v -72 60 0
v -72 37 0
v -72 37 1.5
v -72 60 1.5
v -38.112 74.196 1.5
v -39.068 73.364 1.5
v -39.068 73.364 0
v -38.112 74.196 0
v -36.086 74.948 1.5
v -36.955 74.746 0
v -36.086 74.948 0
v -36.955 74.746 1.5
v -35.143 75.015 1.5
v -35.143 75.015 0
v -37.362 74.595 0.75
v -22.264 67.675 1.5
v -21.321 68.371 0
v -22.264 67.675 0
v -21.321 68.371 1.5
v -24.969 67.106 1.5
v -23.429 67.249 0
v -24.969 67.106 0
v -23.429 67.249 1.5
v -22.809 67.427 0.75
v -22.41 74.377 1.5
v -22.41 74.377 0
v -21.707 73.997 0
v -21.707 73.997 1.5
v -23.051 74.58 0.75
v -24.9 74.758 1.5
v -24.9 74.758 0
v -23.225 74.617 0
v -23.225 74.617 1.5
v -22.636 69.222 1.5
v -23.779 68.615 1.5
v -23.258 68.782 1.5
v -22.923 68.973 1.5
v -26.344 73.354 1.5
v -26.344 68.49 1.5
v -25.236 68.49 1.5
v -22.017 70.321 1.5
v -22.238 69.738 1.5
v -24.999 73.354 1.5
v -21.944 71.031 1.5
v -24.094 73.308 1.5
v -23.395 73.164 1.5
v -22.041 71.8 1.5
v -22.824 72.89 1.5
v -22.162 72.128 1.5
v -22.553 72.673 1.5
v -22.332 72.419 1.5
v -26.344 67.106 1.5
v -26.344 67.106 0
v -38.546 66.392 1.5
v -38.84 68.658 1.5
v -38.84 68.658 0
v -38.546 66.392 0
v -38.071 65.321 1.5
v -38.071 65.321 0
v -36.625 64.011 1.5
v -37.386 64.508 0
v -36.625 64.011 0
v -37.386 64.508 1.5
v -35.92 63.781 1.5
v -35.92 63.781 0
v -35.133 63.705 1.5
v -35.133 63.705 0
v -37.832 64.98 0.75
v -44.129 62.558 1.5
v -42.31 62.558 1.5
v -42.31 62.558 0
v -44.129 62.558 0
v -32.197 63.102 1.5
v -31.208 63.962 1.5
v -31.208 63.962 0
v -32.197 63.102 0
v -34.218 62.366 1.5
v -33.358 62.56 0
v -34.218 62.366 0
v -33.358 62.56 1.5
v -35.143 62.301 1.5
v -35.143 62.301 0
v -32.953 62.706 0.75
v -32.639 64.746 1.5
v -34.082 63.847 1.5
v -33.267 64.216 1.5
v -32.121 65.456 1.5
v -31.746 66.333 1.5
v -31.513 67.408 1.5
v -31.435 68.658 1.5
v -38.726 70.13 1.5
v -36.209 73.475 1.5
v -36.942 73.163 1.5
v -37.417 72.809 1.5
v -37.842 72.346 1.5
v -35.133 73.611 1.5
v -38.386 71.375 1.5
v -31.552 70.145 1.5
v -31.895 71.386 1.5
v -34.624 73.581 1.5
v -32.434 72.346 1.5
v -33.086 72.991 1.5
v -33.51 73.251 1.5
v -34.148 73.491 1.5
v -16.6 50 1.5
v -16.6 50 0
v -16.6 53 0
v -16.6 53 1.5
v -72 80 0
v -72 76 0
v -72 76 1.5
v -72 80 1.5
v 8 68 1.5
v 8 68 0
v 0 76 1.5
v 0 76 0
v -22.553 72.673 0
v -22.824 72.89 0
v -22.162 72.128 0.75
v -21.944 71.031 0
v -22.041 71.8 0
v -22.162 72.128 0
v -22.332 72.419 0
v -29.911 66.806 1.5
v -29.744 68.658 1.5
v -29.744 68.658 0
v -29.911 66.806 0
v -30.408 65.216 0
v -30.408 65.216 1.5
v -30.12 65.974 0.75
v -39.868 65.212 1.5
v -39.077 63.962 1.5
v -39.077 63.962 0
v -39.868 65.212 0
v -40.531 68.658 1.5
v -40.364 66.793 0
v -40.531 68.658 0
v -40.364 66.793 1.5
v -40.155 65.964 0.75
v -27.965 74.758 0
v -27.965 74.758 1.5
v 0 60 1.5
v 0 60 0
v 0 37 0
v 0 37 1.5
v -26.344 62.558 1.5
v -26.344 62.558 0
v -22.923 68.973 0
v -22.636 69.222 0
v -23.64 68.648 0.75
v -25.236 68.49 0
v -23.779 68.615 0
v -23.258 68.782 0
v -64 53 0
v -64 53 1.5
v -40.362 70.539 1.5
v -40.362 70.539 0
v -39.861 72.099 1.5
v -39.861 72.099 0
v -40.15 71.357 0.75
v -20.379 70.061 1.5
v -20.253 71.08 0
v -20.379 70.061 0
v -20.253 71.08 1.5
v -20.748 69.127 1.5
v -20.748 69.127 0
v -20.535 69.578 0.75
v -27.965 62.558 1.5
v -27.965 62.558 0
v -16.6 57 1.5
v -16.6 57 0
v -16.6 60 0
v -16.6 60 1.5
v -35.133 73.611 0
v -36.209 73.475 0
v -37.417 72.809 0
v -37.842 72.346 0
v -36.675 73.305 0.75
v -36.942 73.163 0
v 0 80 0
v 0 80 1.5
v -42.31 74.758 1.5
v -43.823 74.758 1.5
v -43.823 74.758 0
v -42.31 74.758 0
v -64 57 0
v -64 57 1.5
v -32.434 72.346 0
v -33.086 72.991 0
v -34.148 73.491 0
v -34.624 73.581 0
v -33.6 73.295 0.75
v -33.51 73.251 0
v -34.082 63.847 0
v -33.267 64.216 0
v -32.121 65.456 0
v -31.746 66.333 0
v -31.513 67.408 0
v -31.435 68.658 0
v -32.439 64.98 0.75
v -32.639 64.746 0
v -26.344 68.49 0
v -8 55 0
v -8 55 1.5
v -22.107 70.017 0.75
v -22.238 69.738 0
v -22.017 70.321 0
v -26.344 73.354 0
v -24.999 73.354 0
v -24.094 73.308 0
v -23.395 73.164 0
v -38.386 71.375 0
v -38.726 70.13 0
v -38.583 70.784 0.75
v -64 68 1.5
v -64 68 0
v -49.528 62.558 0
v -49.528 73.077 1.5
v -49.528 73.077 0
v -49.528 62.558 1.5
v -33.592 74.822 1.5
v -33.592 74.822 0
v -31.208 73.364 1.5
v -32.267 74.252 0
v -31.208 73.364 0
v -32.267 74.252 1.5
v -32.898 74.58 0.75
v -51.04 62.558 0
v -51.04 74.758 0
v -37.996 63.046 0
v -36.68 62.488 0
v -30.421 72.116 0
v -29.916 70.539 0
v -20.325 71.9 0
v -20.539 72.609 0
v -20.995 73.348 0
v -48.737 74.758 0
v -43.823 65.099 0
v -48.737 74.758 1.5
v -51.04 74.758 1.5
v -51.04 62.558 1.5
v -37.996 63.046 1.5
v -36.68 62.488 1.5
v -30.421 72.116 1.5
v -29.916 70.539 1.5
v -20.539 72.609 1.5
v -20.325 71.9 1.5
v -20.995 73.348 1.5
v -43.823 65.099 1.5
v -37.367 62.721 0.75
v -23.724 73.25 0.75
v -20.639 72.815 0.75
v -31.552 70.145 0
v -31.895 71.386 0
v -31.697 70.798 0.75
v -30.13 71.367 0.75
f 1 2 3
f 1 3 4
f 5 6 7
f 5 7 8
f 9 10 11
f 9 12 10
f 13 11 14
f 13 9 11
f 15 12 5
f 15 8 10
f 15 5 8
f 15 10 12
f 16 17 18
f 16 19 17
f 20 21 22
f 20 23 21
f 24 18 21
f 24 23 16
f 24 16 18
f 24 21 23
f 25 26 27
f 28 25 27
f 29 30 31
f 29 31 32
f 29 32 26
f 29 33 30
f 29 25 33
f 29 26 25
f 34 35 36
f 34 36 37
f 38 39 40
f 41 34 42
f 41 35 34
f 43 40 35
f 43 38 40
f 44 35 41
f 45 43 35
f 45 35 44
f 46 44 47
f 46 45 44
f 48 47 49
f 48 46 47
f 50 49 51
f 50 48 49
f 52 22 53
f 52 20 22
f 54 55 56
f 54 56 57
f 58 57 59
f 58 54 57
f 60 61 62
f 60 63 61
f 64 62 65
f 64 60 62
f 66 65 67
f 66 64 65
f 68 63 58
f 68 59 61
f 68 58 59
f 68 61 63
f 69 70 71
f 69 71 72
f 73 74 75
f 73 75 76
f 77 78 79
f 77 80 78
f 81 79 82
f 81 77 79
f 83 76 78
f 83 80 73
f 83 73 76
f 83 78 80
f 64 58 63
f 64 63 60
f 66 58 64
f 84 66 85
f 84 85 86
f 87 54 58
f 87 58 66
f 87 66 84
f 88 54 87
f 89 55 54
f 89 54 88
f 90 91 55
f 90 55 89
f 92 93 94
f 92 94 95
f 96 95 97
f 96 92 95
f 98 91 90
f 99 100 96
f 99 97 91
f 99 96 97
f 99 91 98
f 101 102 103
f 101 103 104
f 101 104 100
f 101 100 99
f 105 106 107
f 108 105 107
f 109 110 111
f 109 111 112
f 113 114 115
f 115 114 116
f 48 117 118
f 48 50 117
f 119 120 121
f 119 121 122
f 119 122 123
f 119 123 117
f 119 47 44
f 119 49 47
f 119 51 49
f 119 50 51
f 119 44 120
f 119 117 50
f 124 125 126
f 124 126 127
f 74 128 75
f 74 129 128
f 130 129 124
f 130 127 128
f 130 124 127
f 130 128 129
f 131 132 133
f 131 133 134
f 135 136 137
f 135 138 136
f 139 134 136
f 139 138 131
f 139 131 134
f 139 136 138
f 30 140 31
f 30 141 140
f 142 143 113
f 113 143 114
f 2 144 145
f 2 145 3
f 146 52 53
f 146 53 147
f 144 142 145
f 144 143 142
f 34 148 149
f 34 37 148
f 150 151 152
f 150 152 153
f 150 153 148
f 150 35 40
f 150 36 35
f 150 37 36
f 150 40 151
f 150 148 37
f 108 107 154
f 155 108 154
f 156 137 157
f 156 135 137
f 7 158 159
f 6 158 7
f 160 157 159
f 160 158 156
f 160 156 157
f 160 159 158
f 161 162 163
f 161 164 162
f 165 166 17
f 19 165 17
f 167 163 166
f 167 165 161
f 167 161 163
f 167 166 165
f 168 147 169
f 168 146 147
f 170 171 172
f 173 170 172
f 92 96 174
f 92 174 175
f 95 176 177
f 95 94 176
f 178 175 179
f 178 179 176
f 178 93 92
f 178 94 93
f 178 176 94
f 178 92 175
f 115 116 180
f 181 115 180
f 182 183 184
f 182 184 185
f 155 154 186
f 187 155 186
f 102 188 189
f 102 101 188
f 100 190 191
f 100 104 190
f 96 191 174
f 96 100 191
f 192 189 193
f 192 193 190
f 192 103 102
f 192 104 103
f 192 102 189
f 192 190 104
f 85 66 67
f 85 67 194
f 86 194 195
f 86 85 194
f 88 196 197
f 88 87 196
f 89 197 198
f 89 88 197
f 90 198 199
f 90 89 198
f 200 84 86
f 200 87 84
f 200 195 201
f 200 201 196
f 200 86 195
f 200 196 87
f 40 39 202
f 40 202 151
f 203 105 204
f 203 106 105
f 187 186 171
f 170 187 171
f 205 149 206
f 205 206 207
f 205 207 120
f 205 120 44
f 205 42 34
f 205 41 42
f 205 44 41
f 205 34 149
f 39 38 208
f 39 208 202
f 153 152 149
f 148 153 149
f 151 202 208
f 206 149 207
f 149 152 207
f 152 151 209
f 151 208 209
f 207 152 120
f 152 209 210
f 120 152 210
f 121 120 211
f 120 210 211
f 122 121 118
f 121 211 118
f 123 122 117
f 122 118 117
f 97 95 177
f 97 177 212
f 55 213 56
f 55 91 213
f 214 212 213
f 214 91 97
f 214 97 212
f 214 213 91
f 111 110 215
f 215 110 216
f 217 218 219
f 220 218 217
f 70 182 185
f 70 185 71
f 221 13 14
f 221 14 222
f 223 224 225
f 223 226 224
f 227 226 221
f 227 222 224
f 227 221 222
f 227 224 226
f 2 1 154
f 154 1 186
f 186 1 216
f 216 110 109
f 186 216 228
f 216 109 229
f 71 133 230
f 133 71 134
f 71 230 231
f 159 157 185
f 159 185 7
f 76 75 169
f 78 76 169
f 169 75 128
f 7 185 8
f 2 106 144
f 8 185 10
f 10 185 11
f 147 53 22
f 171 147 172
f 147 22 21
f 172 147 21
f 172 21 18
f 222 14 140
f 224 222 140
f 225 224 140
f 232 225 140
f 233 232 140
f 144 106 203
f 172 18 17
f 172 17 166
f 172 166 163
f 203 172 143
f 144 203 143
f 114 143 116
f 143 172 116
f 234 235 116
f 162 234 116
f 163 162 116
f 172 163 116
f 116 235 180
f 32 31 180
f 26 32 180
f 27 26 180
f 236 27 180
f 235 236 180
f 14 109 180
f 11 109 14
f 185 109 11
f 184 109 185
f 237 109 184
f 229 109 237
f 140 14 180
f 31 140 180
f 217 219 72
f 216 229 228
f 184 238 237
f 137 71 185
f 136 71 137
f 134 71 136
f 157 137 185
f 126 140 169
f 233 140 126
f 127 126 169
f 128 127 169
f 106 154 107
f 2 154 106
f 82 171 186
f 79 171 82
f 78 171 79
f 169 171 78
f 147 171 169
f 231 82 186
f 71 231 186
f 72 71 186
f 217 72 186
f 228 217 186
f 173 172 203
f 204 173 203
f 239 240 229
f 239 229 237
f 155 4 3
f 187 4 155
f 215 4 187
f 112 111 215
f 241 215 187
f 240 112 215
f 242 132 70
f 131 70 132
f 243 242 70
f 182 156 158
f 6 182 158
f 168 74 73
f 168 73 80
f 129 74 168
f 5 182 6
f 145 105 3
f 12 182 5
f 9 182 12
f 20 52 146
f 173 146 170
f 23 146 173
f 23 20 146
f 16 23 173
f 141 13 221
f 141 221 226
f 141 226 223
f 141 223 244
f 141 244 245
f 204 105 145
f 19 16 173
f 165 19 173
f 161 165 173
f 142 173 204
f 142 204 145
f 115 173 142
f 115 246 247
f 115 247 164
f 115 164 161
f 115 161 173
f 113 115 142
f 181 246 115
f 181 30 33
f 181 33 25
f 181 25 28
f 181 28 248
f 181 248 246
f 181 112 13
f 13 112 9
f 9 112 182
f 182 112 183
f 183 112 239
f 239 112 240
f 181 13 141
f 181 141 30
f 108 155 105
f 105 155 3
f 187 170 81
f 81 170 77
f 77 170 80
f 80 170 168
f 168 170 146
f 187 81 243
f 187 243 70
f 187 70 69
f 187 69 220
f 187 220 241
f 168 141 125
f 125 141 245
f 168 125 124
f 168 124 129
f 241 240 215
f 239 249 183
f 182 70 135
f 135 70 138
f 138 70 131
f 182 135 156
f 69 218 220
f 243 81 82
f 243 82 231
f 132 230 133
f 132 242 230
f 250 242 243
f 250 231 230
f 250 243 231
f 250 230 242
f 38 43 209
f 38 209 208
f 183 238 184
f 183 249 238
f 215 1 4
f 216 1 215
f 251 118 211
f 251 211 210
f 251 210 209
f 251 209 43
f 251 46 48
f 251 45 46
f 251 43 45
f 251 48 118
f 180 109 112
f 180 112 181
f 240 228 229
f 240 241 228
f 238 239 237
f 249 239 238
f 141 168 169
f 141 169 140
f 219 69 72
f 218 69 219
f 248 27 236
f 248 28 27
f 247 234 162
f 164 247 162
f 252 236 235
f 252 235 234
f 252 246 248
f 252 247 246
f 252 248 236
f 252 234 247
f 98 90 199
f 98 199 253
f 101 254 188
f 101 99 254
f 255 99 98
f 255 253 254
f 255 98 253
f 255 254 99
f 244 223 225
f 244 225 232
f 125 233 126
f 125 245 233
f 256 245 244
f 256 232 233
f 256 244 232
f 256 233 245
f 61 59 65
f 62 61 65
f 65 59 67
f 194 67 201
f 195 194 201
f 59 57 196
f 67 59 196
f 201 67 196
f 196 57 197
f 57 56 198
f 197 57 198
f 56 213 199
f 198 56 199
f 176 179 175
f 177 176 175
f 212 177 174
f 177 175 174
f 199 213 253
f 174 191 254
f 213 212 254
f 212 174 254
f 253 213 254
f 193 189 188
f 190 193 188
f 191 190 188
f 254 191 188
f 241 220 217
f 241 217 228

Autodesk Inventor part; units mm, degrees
ref_plane "YZ Plane" through (0, 0, 0) normal (1, 0, 0) x (0, 1, 0)
ref_plane "XZ Plane" through (0, 0, 0) normal (0, 1, 0) x (-1, 0, 0)
ref_plane "XY Plane" through (0, 0, 0) normal (0, 0, 1) x (1, 0, 0)
sketch "Sketch1" plane through (0, 0, 0) normal (0, 0, 1) x (1, 0, 0)
  circle A0 centre (-72, 68) radius 8 construction
  line L0 (-72, 60) -> (0, 60) construction
  line L1 (-72, 76) -> (-64, 68)
  line L2 (-72, 60) -> (-64, 68)
  line L3 (-72, 76) -> (-72, 80)
  line L4 (0, 76) -> (0, 80)
  line L5 (-72, 80) -> (0, 80)
  line L6 (-72, 76) -> (11.4847, 76) construction
  line L7 (-64, 68) -> (11.3495, 68) construction
  line L8 (-72, 60) -> (23.0654, 60) construction
  circle A1 centre (0, 68) radius 8 construction
  line L9 (0, 60) -> (8, 68)
  line L10 (8, 68) -> (0, 76)
  line L11 (-34, 51.1) -> (-34, 39.9508) construction
  line L12 (-36, 51.1) -> (-36, 38.5) construction
  line L13 (0, 37) -> (-91.064, 37) construction
  line L14 (0, 37) -> (-72, 37)
  line L15 (-64, 68) -> (-64, -7.5721) construction
  line L16 (31.0795, 0) -> (31.0795, 55) construction
  line L17 (31.0795, 55) -> (-111.8136, 55) construction
  line L18 (-8, 68) -> (-8, -20.4909) construction
  line L19 (-8, 55) -> (-16.6, 55) construction
  line L20 (-16.6, 55) -> (-16.6, 50) construction
  line L21 (-16.6, 50) -> (-8, 55)
  line L22 (-16.6, 60) -> (-8, 55)
  line L23 (-16.6, 50) -> (-16.6, 53)
  line L24 (-16.6, 53) -> (-64, 53)
  line L25 (-64, 53) -> (-64, 57)
  line L26 (-64, 57) -> (-16.6, 57)
  line L27 (-16.6, 57) -> (-16.6, 60)
  line L28 (-72, 37) -> (-72, 60)
  line L29 (-72, 35.1512) -> (-72, 37)
  line L30 (0, 60) -> (0, 37)
  point P0 (0, 78)
  point P1 (-72, 78)
  point P2 (-137.4598, 47.0487)
  dimension "d5" = 72
  dimension "d50" = 55
  dimension "d51" = 8.6
  dimension "d52" = 5
  dimension "d54" = 4
  dimension "d55" = 1.5
extrude "Extrusion7" add sketch "Sketch1" along normal blind 1.5
sketch "Sketch10" plane through (0, 0, 1.5) normal (0, 0, 1) x (1, 0, 0)
  line L0 (-52.276, 75.0151) -> (-43.77, 75.0151) construction
  line L1 (-43.77, 75.0151) -> (-43.77, 65.3644) construction
  line L2 (-43.77, 65.3644) -> (-52.276, 65.3644) construction
  line L3 (-52.276, 65.3644) -> (-52.276, 75.0151) construction
  line L4 (-42.3103, 62.5581) -> (-44.1294, 62.5581)
  line L5 (-44.1294, 62.5581) -> (-49.5275, 73.0774)
  line L6 (-49.5275, 73.0774) -> (-49.5275, 62.5581)
  line L7 (-49.5275, 62.5581) -> (-51.0401, 62.5581)
  line L8 (-51.0401, 62.5581) -> (-51.0401, 74.7581)
  line L9 (-51.0401, 74.7581) -> (-48.7366, 74.7581)
  line L10 (-48.7366, 74.7581) -> (-43.823, 65.0989)
  line L11 (-43.823, 65.0989) -> (-43.823, 74.7581)
  line L12 (-43.823, 74.7581) -> (-42.3103, 74.7581)
  line L13 (-42.3103, 74.7581) -> (-42.3103, 62.5581)
  spline S0 degree 2 poles (-31.2077, 73.3641) (-30.5157, 72.5534) (-29.7445, 70.1806) (-29.7445, 68.6581) knots 0 0 0 1 2 2 2
  spline S1 degree 2 poles (-29.7445, 68.6581) (-29.7445, 67.1751) (-30.4959, 64.7727) (-31.2077, 63.962) knots 0 0 0 1 2 2 2
  spline S2 degree 2 poles (-31.2077, 63.962) (-31.9591, 63.1117) (-33.9463, 62.301) (-35.1426, 62.301) knots 0 0 0 1 2 2 2
  spline S3 degree 2 poles (-35.1426, 62.301) (-36.3784, 62.301) (-38.3557, 63.1414) (-39.0774, 63.962) knots 0 0 0 1 2 2 2
  spline S4 degree 2 poles (-39.0774, 63.962) (-39.7794, 64.7727) (-40.5307, 67.1553) (-40.5307, 68.6581) knots 0 0 0 1 2 2 2
  spline S5 degree 2 poles (-40.5307, 68.6581) (-40.5307, 70.1905) (-39.7695, 72.5237) (-39.0675, 73.3641) knots 0 0 0 1 2 2 2
  spline S6 degree 2 poles (-39.0675, 73.3641) (-38.3557, 74.1748) (-36.3685, 75.0151) (-35.1426, 75.0151) knots 0 0 0 1 2 2 2
  spline S7 degree 2 poles (-35.1426, 75.0151) (-33.8969, 75.0151) (-31.8998, 74.1451) (-31.2077, 73.3641) knots 0 0 0 1 2 2 2
  spline S8 degree 2 poles (-31.4351, 68.6581) (-31.4351, 69.8642) (-31.9591, 71.7328) (-32.4337, 72.3458) knots 0 0 0 1 2 2 2
  spline S9 degree 2 poles (-32.4337, 72.3458) (-32.9181, 72.9785) (-34.2824, 73.6112) (-35.1327, 73.6112) knots 0 0 0 1 2 2 2
  spline S10 degree 2 poles (-35.1327, 73.6112) (-36.0126, 73.6112) (-37.3374, 72.9983) (-37.8416, 72.3458) knots 0 0 0 1 2 2 2
  spline S11 degree 2 poles (-37.8416, 72.3458) (-38.326, 71.7229) (-38.8401, 69.8445) (-38.8401, 68.6581) knots 0 0 0 1 2 2 2
  spline S12 degree 2 poles (-38.8401, 68.6581) (-38.8401, 66.2556) (-36.8233, 63.7049) (-35.1327, 63.7049) knots 0 0 0 1 2 2 2
  spline S13 degree 2 poles (-35.1327, 63.7049) (-33.4421, 63.7049) (-31.4351, 66.2556) (-31.4351, 68.6581) knots 0 0 0 1 2 2 2
  spline S14 degree 2 poles (-20.2534, 71.0803) (-20.2534, 70.2894) (-20.817, 68.8657) (-21.3212, 68.3714) knots 0 0 0 1 2 2 2
  spline S15 degree 2 poles (-21.3212, 68.3714) (-21.9539, 67.7485) (-23.6643, 67.1059) (-24.9693, 67.1059) knots 0 0 0 1 2 2 2
  line L14 (-24.9693, 67.1059) -> (-26.3435, 67.1059)
  line L15 (-26.3435, 67.1059) -> (-26.3435, 62.5581)
  line L16 (-26.3435, 62.5581) -> (-27.9649, 62.5581)
  line L17 (-27.9649, 62.5581) -> (-27.9649, 74.7581)
  line L18 (-27.9649, 74.7581) -> (-24.9001, 74.7581)
  spline S16 degree 2 poles (-24.9001, 74.7581) (-23.8126, 74.7581) (-22.2901, 74.4022) (-21.7068, 73.9968) knots 0 0 0 1 2 2 2
  spline S17 degree 2 poles (-21.7068, 73.9968) (-21.0246, 73.5321) (-20.2534, 72.0986) (-20.2534, 71.0803) knots 0 0 0 1 2 2 2
  spline S18 degree 2 poles (-21.944, 71.0308) (-21.944, 71.6636) (-22.379, 72.5929) (-22.8239, 72.8895) knots 0 0 0 1 2 2 2
  spline S19 degree 2 poles (-22.8239, 72.8895) (-23.2095, 73.1466) (-24.2377, 73.3542) (-24.999, 73.3542) knots 0 0 0 1 2 2 2
  line L19 (-24.999, 73.3542) -> (-26.3435, 73.3542)
  line L20 (-26.3435, 73.3542) -> (-26.3435, 68.49)
  line L21 (-26.3435, 68.49) -> (-25.2363, 68.49)
  spline S20 degree 2 poles (-25.2363, 68.49) (-24.2476, 68.49) (-23.0316, 68.8064) (-22.6361, 69.2216) knots 0 0 0 1 2 2 2
  spline S21 degree 2 poles (-22.6361, 69.2216) (-22.2703, 69.5874) (-21.944, 70.4475) (-21.944, 71.0308) knots 0 0 0 1 2 2 2
  point P0 (0, 0)
extrude "Extrusion11" cut sketch "Sketch10" against normal up to surface (1.5 mm away)
properties part number "MS_R_Front_top_yellow_v3"
